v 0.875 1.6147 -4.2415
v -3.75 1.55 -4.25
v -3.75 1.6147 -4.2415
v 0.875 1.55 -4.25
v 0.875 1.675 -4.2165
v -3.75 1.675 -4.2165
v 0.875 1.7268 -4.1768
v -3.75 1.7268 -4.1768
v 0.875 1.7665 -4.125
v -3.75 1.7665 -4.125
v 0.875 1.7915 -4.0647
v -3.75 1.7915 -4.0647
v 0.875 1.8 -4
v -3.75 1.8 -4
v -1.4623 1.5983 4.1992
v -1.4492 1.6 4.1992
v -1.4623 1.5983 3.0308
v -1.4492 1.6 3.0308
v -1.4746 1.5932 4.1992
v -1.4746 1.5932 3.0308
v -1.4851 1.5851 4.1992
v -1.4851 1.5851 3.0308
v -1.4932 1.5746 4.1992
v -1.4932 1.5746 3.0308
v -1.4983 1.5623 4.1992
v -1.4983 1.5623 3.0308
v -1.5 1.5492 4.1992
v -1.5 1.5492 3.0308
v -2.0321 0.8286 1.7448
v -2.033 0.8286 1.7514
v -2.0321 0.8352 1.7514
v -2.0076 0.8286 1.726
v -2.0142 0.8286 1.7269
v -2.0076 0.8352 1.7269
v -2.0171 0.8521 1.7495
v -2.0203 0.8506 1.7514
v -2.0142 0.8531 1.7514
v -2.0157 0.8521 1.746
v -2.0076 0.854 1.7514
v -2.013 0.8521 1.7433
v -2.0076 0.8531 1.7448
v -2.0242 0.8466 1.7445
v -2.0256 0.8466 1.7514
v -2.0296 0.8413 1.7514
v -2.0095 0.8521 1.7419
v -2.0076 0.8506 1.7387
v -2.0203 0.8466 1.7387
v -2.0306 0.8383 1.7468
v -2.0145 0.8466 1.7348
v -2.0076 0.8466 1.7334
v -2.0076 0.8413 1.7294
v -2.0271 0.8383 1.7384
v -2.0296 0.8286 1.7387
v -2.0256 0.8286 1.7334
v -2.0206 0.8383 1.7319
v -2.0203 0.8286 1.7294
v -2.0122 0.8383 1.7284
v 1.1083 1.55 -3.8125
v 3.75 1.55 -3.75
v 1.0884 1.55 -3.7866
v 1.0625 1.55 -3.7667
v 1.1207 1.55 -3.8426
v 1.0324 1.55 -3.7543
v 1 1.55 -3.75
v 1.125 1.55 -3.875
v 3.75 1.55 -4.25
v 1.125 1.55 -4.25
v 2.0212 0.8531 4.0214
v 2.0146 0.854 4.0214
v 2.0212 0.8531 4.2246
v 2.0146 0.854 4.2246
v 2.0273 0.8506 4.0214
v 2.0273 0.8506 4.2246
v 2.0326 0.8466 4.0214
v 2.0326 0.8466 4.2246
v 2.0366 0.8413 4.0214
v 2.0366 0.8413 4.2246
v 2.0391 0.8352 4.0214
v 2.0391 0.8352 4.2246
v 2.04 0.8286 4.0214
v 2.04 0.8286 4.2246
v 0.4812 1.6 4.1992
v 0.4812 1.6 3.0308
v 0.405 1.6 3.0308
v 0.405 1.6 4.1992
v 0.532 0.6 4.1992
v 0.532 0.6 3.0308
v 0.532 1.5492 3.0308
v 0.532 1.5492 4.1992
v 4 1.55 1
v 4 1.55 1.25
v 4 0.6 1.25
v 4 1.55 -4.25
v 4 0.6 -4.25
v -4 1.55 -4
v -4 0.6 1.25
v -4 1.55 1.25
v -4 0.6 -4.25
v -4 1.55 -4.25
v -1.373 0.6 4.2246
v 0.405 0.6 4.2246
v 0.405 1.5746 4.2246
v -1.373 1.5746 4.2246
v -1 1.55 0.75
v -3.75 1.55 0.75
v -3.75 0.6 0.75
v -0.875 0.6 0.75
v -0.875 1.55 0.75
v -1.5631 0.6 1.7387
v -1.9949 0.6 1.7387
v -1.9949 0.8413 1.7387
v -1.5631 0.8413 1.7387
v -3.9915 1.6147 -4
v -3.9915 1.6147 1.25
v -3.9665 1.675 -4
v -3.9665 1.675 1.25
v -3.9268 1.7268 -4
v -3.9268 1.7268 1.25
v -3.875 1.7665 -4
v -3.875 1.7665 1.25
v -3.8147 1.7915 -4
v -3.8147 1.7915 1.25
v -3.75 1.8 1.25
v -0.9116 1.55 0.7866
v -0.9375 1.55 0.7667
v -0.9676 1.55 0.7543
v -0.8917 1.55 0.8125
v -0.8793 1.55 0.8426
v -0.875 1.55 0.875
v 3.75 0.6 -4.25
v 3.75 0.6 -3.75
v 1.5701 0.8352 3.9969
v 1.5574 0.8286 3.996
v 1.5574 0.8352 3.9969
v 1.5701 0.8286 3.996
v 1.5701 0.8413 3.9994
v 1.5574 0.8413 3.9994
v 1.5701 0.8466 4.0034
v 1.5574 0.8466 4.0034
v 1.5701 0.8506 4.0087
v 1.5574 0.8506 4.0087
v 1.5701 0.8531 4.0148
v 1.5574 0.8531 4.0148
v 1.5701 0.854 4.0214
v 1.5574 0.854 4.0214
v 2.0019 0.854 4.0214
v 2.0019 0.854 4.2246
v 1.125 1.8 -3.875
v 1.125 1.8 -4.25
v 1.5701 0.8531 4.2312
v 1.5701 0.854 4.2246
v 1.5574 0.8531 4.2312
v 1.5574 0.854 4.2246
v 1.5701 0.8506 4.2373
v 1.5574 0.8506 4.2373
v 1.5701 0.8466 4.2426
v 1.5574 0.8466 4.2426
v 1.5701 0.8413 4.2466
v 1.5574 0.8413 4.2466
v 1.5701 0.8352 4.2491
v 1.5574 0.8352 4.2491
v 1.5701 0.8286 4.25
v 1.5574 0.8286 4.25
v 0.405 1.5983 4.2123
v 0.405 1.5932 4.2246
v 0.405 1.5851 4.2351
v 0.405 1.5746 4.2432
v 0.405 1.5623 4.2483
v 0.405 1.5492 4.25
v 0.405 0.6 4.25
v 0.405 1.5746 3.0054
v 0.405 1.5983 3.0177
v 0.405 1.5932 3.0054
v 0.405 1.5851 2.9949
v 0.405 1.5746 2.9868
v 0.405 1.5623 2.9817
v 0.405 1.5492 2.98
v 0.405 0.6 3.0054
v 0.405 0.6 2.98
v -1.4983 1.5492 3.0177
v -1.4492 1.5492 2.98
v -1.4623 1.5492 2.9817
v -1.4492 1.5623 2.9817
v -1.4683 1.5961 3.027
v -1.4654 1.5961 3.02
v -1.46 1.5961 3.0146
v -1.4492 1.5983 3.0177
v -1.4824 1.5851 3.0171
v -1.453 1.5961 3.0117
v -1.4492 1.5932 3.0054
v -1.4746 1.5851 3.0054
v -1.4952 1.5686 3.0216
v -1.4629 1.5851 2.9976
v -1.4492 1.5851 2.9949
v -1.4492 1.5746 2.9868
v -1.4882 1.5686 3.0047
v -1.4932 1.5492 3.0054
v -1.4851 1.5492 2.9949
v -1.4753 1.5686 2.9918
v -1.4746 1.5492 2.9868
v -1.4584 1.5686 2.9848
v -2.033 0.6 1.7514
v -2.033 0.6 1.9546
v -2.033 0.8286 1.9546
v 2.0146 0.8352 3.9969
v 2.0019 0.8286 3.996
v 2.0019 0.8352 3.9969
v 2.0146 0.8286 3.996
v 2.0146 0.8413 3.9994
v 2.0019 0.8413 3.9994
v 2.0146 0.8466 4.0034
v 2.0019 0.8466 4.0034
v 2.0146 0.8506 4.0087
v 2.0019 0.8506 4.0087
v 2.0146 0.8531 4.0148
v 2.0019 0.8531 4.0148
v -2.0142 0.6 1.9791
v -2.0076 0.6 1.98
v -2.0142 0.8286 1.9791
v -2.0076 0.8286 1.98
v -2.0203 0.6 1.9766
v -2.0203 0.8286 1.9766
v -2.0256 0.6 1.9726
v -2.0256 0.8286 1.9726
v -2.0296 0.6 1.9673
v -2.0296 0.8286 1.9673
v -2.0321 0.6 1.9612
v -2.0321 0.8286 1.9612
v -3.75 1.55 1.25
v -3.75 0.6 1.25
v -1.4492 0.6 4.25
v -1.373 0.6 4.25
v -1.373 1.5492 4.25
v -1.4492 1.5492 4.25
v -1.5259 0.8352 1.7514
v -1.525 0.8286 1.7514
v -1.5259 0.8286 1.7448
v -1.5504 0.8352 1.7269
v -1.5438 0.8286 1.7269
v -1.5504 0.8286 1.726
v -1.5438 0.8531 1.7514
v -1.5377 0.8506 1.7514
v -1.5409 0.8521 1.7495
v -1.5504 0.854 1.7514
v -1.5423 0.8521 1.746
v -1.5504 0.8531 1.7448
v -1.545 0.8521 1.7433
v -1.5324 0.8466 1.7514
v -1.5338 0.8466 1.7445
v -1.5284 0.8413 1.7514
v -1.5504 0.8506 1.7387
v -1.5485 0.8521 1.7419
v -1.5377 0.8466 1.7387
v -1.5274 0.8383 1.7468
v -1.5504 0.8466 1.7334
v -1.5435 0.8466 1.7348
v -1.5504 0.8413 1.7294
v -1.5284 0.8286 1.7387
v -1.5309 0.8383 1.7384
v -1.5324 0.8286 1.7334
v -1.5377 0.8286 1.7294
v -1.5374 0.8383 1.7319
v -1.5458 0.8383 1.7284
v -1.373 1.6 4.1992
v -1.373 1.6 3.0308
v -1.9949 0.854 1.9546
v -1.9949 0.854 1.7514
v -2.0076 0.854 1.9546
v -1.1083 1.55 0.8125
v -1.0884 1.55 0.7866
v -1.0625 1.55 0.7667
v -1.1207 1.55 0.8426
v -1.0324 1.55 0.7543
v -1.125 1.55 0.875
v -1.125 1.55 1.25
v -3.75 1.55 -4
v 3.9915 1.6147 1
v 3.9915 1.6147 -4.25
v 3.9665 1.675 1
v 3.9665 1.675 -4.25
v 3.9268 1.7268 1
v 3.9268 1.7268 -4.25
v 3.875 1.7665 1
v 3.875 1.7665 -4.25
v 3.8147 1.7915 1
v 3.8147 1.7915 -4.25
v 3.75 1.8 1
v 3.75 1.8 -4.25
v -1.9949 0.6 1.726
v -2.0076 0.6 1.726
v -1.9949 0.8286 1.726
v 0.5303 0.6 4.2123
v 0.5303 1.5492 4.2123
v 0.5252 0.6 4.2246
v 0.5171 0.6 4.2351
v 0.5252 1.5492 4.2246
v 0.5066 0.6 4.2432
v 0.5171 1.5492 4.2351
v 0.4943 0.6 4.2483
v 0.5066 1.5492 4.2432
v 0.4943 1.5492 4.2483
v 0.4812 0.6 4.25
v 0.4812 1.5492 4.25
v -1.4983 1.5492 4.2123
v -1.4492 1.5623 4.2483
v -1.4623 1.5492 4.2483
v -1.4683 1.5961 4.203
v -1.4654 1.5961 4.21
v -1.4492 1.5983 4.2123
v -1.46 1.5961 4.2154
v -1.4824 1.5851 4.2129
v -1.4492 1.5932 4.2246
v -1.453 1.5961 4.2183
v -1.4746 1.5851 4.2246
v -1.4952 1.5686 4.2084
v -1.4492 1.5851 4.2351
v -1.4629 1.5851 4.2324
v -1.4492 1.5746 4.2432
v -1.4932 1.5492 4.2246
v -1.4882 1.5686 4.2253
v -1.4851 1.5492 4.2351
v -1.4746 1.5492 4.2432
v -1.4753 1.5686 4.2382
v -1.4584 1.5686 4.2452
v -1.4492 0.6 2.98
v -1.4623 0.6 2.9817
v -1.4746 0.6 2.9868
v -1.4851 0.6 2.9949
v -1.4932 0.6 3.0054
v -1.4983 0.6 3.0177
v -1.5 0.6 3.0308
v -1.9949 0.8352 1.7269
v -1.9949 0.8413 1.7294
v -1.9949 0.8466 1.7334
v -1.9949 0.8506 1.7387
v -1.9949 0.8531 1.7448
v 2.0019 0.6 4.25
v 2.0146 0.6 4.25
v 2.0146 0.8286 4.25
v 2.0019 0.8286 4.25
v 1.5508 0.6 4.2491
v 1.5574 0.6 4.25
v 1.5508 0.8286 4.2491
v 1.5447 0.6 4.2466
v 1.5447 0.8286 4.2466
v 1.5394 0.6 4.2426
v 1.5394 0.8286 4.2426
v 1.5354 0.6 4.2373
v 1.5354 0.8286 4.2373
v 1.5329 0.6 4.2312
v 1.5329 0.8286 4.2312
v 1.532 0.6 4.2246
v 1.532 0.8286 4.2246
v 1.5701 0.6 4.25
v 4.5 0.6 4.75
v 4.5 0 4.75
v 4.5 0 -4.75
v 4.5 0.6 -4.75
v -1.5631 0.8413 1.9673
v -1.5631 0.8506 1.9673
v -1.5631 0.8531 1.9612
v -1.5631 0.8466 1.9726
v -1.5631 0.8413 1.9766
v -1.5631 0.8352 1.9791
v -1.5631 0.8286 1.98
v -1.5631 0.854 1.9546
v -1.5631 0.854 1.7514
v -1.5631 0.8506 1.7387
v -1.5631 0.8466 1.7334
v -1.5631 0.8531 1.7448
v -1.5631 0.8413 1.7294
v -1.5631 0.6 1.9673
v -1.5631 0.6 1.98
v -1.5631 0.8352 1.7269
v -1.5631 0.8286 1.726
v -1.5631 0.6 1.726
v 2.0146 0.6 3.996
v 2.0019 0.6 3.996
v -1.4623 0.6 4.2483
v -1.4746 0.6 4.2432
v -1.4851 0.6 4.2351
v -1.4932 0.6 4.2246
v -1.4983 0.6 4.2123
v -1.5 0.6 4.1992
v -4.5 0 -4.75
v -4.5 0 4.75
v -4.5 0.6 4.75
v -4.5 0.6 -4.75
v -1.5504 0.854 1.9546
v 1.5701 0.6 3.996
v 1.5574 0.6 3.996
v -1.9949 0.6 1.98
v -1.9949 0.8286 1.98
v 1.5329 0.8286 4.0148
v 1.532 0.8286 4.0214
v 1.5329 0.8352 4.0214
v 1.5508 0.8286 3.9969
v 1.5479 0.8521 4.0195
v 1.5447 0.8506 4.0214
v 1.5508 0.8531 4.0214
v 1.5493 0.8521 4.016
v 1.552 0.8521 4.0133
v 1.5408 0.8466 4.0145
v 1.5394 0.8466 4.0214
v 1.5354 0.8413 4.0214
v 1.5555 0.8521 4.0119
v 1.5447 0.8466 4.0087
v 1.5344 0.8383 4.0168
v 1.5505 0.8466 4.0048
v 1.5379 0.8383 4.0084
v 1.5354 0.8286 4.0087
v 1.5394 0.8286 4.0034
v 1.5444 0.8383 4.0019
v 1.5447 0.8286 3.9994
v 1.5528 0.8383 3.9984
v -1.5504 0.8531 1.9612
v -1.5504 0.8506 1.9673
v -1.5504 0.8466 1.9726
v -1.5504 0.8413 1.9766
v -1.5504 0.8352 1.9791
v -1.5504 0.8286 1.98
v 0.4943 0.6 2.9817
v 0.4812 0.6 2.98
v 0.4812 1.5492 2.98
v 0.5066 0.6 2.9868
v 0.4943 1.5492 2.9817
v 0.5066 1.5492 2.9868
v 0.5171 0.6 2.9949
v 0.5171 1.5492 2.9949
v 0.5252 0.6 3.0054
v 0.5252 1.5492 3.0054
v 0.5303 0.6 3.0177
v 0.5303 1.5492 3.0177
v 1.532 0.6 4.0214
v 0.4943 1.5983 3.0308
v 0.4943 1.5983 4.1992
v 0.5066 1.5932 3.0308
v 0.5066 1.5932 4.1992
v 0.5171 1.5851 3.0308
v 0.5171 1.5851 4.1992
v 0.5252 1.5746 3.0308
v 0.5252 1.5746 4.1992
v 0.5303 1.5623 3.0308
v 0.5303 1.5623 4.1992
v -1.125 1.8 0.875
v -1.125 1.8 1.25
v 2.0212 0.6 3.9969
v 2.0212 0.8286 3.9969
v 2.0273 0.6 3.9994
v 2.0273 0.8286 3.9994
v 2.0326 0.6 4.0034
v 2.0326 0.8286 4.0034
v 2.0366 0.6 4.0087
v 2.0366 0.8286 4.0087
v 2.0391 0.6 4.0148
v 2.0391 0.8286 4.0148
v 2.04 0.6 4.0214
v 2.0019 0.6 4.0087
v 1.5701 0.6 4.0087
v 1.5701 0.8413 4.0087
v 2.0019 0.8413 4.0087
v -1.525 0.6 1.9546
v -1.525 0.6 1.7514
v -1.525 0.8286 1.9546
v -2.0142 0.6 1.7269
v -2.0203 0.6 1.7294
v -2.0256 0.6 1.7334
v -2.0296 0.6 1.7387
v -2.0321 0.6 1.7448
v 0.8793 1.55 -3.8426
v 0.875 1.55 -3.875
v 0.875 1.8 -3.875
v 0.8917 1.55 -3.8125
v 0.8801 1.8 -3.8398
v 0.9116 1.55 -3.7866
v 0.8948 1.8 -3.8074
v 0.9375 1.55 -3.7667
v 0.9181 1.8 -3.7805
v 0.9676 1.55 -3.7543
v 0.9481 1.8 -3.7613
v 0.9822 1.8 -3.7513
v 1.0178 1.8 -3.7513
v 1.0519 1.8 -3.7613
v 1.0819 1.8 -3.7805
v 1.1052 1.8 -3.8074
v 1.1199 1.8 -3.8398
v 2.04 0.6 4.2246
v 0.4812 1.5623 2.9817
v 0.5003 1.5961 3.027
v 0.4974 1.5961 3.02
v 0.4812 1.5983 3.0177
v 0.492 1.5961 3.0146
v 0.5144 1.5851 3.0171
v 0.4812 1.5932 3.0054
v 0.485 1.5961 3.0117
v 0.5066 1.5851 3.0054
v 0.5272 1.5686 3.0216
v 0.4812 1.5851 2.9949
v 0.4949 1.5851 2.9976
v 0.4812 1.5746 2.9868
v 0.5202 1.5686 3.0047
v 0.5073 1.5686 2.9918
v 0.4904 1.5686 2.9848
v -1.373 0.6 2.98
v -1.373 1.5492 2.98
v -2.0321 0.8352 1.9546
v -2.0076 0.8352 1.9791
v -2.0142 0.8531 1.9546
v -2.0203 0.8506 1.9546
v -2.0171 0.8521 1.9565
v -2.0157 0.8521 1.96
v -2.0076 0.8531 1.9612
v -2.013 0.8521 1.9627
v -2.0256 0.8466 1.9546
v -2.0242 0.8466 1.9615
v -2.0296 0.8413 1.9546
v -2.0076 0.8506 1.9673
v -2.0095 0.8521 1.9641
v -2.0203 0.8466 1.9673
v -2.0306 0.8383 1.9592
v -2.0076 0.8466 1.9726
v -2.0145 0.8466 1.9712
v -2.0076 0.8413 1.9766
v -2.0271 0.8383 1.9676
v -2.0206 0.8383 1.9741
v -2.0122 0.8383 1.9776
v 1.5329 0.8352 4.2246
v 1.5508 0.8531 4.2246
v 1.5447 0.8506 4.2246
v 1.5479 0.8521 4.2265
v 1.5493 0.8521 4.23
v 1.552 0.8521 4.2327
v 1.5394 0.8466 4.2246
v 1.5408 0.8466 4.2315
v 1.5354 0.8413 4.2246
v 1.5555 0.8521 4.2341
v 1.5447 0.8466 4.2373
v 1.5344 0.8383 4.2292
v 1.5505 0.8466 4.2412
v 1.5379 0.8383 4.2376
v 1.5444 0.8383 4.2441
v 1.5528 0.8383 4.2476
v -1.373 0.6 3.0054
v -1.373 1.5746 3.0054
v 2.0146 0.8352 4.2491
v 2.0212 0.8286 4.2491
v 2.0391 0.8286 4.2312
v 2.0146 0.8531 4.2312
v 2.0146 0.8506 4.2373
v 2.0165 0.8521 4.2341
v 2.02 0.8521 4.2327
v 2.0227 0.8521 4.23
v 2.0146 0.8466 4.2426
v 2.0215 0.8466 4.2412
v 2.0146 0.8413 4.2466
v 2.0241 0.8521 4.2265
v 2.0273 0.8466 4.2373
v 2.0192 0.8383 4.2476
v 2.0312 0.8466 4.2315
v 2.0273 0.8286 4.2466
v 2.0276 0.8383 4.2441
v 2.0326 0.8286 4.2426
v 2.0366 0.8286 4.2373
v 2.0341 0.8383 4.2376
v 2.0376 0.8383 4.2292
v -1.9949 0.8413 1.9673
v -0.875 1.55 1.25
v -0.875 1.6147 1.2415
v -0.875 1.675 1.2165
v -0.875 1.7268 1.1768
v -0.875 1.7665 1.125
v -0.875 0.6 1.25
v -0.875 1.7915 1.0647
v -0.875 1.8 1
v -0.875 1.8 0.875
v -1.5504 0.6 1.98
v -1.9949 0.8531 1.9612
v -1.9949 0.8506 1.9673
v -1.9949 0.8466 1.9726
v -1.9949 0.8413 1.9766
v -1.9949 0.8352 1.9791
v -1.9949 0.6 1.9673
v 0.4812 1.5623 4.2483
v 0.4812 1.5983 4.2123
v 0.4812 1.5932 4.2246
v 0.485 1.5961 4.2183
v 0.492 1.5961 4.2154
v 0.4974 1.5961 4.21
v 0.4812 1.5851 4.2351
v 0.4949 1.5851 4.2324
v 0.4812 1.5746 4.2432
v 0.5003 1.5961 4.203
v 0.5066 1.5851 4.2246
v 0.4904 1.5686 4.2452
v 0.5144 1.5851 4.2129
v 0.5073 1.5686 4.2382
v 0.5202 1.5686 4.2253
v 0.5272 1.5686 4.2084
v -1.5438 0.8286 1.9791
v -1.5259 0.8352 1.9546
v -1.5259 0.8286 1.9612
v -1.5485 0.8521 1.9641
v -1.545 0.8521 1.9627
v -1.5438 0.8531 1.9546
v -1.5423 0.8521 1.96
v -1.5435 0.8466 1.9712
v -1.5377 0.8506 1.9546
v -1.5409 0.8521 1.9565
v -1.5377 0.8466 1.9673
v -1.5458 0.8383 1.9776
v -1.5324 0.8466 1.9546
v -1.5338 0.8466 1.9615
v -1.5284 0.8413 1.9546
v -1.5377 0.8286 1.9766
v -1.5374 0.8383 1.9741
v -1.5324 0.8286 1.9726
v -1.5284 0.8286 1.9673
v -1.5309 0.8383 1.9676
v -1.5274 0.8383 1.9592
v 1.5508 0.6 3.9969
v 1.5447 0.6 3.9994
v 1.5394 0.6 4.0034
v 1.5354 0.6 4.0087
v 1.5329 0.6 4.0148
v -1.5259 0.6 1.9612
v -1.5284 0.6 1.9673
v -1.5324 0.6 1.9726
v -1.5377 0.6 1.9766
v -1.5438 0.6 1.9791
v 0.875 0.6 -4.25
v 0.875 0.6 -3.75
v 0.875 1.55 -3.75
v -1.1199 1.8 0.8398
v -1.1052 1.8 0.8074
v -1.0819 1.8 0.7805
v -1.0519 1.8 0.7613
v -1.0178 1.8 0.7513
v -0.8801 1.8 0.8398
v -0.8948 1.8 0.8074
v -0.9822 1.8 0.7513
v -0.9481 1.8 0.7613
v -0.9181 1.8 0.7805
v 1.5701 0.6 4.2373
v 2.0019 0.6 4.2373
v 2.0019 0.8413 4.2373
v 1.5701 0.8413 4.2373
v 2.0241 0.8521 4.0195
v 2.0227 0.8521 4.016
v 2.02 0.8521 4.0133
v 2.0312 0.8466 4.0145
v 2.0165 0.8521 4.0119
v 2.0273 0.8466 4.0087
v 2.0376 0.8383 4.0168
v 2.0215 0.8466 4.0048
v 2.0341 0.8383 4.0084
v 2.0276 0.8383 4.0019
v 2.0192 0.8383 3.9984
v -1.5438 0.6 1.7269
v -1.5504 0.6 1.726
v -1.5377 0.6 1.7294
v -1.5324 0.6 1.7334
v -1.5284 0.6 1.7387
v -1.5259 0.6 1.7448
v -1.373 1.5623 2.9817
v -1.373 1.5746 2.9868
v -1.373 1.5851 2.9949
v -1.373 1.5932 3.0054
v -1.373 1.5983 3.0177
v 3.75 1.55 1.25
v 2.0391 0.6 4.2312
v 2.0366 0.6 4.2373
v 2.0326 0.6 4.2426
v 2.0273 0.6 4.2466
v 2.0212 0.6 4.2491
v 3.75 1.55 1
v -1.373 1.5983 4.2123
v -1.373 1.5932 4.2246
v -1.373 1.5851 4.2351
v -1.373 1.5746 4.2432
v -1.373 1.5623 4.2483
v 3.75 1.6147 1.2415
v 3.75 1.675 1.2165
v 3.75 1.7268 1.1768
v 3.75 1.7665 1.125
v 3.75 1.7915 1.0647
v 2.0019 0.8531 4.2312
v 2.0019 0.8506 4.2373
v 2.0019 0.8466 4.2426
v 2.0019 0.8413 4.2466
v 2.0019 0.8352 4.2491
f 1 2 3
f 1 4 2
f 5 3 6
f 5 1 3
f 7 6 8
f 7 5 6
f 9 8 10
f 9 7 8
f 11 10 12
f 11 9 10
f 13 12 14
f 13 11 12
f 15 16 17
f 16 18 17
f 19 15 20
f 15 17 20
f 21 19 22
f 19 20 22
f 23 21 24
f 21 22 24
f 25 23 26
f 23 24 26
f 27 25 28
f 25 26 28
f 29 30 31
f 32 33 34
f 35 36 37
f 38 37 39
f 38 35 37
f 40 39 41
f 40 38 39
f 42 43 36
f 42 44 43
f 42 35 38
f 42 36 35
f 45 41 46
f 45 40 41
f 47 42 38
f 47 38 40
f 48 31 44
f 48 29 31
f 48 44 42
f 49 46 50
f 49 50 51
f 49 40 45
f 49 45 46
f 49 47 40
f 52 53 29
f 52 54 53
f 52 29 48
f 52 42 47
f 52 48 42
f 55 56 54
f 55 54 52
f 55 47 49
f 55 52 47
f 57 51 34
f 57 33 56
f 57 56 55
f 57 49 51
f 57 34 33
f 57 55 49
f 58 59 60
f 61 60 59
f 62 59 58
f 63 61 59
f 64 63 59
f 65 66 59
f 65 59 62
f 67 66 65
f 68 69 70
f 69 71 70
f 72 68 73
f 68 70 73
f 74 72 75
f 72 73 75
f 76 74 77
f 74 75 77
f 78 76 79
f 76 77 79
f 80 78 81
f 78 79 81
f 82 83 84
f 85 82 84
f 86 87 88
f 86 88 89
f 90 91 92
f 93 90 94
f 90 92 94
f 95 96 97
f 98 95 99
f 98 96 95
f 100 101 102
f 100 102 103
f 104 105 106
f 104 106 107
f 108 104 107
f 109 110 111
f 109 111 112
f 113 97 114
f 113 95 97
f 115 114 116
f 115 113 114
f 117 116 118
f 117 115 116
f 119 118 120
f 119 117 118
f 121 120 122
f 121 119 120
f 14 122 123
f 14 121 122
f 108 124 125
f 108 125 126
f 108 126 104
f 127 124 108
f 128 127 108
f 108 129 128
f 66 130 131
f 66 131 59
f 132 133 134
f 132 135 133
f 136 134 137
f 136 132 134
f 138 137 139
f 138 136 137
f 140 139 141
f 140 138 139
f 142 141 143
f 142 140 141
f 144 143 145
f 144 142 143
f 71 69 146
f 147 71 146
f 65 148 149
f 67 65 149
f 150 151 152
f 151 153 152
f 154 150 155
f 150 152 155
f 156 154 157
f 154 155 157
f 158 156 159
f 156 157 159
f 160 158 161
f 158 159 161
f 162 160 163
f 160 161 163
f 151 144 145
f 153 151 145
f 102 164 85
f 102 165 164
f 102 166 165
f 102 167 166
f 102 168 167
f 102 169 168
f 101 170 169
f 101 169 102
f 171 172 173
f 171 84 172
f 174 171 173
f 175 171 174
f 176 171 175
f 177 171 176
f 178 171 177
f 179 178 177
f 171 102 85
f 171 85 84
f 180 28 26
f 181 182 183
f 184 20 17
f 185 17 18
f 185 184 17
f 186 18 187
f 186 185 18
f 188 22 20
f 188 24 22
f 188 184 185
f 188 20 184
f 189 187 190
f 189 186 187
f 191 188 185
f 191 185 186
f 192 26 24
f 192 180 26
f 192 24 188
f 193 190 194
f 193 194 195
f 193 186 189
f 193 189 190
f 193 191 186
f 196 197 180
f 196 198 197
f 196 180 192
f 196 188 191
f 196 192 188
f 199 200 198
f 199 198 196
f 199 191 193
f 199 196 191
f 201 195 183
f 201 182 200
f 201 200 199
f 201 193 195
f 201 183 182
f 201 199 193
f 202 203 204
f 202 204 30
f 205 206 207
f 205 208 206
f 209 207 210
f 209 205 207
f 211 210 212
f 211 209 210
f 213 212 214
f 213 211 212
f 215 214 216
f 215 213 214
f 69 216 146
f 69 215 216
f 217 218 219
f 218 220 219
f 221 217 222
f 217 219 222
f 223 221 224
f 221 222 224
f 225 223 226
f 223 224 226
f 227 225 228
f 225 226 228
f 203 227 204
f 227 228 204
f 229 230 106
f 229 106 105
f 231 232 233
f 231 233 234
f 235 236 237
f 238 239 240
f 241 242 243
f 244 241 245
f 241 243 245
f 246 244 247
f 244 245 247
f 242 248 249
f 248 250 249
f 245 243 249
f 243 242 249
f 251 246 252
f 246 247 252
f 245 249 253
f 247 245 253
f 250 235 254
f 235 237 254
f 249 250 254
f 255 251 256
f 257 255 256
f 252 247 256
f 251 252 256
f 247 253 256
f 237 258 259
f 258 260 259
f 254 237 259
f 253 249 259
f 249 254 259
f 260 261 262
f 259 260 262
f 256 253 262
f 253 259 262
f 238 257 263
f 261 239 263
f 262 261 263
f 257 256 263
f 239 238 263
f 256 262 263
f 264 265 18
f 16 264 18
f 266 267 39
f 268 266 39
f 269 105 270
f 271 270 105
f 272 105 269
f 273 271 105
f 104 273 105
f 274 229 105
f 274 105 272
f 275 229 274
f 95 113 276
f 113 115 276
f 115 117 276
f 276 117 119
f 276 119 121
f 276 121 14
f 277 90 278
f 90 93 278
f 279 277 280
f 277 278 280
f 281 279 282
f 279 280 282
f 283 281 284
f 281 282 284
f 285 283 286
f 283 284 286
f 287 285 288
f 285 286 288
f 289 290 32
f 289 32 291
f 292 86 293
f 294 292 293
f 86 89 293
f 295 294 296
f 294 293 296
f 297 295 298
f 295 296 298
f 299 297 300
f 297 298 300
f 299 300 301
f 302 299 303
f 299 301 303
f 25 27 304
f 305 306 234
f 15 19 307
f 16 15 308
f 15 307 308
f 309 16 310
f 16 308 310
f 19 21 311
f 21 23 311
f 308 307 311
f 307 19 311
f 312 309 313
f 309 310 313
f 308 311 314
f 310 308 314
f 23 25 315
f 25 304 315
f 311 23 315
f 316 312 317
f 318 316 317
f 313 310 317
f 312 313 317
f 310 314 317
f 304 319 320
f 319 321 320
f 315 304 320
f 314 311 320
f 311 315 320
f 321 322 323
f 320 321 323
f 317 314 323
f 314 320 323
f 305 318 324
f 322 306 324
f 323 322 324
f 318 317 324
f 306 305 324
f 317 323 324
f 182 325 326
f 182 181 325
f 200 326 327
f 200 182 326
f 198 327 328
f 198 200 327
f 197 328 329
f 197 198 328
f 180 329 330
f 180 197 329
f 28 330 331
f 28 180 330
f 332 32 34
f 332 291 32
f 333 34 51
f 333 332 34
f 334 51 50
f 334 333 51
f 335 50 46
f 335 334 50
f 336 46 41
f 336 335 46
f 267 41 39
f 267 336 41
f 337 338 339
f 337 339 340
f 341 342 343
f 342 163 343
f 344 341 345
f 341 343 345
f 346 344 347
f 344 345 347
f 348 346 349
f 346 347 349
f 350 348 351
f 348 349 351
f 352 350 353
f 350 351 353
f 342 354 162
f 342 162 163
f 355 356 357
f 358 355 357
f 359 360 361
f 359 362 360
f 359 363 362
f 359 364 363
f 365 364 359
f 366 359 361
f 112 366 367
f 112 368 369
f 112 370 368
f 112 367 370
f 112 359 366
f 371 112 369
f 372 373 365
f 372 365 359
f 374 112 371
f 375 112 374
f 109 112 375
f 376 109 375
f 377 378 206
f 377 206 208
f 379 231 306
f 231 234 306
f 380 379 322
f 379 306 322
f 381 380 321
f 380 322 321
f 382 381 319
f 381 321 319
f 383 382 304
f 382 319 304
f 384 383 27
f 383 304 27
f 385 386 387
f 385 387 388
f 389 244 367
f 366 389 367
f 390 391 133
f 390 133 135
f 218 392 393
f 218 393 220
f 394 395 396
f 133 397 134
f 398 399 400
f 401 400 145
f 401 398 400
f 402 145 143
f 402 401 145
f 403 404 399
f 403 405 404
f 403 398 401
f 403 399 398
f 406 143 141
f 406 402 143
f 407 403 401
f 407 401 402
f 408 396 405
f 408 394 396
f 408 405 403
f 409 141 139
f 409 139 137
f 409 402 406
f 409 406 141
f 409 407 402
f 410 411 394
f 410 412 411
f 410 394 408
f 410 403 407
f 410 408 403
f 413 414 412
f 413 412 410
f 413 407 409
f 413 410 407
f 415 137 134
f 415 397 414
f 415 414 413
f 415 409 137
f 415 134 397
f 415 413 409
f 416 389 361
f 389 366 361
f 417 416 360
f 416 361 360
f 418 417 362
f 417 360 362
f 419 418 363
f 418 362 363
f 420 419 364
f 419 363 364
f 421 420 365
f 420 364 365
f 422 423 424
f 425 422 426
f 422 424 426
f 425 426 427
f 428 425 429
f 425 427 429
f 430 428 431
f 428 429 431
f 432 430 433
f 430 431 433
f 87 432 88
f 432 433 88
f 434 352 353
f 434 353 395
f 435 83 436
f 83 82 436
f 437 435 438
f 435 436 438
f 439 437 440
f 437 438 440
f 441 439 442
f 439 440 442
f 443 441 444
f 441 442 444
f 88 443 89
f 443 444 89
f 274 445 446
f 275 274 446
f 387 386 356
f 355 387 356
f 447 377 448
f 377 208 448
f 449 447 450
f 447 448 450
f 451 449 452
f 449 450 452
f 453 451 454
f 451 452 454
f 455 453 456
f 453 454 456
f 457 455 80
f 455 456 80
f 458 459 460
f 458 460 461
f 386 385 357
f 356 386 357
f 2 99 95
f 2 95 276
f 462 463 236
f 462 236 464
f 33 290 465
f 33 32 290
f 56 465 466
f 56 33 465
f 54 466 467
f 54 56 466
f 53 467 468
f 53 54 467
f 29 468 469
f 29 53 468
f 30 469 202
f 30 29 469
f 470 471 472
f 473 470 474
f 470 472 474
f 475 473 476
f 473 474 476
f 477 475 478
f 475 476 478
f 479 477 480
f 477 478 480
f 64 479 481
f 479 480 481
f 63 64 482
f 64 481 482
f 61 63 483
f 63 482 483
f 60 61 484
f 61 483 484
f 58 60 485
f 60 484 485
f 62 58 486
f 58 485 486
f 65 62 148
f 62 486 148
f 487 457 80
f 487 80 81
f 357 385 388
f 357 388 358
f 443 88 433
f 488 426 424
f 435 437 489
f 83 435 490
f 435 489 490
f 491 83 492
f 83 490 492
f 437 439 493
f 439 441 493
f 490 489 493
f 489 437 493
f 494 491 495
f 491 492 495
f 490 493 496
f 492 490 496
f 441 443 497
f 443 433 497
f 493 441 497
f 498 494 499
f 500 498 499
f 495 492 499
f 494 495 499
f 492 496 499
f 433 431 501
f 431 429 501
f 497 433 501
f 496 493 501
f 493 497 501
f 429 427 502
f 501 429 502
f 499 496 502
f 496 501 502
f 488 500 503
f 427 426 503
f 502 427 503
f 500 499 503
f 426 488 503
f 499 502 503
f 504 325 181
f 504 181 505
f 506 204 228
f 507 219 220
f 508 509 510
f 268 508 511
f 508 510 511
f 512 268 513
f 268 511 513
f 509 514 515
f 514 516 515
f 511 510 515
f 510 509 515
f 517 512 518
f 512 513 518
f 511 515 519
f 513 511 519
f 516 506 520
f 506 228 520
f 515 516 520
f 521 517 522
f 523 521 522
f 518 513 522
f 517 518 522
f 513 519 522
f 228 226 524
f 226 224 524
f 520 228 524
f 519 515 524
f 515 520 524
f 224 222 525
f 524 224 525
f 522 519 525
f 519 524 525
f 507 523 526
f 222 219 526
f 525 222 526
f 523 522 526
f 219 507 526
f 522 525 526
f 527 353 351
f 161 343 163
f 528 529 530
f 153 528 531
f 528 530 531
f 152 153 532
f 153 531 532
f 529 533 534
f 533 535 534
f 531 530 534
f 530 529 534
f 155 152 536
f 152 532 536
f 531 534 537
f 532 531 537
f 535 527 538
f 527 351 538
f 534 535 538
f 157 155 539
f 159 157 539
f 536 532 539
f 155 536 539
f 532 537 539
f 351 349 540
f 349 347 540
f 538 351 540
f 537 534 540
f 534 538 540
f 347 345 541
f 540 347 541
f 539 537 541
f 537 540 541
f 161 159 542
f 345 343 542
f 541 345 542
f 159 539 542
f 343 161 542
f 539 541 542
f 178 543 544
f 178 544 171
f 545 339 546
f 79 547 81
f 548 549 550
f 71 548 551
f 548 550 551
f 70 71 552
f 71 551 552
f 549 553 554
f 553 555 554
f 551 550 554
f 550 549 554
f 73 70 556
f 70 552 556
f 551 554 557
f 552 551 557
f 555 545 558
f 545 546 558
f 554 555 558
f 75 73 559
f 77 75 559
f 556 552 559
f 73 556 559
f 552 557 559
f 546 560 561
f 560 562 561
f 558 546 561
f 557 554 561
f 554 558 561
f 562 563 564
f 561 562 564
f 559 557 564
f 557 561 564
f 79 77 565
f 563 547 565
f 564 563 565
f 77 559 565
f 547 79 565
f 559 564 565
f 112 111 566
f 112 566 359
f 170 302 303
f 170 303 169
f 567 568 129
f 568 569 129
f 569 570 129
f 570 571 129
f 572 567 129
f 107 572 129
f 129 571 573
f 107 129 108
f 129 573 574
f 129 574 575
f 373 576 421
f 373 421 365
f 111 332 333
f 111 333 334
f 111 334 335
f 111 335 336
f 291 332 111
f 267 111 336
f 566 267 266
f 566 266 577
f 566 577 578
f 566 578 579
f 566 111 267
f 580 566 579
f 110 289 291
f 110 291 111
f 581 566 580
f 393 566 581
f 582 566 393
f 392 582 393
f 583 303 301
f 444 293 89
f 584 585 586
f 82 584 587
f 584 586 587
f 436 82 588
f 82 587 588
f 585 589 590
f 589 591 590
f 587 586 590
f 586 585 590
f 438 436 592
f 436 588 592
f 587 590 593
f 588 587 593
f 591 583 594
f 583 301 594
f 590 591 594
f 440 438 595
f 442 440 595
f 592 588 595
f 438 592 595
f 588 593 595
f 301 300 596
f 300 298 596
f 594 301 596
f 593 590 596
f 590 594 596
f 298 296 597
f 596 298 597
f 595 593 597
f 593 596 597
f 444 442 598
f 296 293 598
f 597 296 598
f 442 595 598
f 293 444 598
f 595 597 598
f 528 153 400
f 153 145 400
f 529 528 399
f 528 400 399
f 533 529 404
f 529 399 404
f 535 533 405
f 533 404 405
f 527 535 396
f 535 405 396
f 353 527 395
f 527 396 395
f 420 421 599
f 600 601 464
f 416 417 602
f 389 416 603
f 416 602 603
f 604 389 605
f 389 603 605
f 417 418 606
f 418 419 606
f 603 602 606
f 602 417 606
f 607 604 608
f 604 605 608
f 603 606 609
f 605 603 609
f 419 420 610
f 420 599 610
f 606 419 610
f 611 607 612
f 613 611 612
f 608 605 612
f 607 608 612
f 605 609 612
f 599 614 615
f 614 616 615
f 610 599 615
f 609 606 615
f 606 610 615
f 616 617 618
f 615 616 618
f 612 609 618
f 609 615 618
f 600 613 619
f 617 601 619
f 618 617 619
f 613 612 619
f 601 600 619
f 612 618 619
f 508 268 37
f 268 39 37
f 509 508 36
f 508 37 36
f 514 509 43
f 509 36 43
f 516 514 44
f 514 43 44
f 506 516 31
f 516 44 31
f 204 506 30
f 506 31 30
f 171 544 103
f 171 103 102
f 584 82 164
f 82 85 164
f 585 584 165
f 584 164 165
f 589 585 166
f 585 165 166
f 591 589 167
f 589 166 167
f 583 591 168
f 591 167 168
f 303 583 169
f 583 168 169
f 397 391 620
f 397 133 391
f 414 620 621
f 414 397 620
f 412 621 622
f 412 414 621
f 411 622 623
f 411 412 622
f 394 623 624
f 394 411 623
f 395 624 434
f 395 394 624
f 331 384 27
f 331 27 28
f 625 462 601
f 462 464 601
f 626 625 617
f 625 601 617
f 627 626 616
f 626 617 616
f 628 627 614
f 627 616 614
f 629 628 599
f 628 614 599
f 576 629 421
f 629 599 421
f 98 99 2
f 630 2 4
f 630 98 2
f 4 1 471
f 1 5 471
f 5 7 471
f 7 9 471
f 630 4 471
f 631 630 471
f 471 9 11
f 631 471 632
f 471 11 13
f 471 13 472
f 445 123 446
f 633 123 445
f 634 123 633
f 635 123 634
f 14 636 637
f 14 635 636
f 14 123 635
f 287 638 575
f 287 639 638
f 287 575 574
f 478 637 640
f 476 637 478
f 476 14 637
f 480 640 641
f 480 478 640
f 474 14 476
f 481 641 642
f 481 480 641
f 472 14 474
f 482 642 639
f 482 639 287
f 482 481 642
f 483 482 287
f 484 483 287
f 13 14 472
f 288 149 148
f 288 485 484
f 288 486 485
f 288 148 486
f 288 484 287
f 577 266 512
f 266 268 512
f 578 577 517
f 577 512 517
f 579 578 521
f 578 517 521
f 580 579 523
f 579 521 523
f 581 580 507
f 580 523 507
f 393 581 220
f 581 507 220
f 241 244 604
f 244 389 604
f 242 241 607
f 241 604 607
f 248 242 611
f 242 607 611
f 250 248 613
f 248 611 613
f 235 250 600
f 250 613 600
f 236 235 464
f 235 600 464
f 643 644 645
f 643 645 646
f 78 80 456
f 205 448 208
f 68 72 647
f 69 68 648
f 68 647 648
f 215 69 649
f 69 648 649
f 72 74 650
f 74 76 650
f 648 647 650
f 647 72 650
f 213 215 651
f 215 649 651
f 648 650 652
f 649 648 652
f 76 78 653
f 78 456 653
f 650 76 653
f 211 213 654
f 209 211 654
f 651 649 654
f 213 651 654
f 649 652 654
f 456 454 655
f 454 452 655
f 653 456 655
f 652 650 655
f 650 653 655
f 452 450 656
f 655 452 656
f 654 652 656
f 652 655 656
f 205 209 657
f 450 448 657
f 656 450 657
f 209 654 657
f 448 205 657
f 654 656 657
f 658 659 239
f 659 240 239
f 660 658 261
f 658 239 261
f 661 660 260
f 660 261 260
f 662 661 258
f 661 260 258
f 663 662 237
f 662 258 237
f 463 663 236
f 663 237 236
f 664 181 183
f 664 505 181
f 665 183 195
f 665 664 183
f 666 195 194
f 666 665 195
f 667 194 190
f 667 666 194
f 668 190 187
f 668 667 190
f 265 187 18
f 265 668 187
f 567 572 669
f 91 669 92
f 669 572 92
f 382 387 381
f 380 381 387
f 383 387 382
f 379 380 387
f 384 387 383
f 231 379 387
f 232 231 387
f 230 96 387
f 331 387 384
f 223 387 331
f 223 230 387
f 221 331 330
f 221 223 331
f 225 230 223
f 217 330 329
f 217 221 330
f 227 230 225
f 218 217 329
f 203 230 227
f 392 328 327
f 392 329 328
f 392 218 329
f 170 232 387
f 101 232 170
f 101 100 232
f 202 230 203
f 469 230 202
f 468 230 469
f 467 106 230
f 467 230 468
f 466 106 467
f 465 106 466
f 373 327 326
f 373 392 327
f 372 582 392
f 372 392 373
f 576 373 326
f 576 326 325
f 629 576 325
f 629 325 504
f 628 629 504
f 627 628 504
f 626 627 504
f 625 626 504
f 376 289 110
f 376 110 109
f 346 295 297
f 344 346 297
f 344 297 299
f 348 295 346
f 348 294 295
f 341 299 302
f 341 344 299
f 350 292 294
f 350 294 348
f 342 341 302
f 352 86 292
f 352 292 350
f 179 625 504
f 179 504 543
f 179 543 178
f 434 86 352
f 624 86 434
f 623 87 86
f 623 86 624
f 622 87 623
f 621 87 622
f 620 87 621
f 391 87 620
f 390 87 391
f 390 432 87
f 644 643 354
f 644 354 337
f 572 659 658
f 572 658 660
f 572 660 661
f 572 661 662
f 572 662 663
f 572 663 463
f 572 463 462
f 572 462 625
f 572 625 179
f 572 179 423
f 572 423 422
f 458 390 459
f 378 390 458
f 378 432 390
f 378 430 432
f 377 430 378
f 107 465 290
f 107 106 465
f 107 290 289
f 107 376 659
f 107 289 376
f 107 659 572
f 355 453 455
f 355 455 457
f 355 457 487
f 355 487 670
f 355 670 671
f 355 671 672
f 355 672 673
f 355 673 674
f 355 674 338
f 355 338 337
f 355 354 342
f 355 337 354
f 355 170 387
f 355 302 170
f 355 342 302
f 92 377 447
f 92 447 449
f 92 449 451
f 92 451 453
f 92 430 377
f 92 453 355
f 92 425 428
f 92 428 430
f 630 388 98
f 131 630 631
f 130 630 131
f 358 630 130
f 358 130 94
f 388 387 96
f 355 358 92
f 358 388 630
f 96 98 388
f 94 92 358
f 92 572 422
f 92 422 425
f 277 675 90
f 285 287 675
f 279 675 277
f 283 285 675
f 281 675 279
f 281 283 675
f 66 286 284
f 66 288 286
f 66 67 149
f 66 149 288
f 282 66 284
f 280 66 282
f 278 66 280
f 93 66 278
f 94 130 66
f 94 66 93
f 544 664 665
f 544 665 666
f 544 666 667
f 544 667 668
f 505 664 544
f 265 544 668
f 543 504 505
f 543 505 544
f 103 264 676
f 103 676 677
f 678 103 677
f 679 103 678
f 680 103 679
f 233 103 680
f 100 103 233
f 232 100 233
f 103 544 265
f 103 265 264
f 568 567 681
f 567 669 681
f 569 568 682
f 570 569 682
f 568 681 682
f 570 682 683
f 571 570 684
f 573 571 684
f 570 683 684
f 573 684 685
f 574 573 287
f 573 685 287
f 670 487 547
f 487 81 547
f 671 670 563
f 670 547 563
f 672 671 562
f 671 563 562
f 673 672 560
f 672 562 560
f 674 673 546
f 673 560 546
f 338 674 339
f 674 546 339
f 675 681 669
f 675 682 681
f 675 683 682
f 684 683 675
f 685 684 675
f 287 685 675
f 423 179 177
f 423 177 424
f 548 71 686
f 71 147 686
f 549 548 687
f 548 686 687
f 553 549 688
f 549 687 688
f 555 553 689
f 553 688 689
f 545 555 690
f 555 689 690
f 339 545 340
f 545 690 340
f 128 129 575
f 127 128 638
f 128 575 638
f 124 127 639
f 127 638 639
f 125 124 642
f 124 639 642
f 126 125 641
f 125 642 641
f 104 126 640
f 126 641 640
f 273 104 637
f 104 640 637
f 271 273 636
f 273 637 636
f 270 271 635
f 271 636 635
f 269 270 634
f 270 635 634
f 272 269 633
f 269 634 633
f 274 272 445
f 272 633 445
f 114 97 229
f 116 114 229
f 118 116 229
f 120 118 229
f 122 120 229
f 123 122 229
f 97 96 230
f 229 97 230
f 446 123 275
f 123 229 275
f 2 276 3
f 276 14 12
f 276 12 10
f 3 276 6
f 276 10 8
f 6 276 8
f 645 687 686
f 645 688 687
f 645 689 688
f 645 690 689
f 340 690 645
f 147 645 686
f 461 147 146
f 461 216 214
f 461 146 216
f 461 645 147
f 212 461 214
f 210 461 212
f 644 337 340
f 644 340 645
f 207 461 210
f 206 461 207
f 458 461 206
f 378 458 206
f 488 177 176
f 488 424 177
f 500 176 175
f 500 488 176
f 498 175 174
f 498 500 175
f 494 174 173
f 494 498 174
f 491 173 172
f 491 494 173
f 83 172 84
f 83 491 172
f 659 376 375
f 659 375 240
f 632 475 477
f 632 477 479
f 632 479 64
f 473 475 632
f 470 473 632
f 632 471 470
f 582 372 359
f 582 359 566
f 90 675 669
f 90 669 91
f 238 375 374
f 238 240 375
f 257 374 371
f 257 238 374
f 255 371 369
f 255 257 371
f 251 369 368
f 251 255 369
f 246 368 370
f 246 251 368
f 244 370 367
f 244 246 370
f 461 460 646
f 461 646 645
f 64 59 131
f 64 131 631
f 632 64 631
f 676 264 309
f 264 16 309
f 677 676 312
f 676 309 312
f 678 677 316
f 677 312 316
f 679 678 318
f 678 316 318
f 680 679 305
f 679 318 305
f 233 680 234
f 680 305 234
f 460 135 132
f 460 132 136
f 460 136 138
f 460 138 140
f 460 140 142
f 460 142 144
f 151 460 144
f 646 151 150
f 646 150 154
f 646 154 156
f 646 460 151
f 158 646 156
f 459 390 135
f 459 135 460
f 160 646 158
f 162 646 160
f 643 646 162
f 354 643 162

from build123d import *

# Parameters (mm, degrees)
SKETCH1_W           = 9
SKETCH1_H           = 9.5
BOSS_EXTRUDE1_DEPTH = 0.6
SKETCH2_W           = 8
SKETCH2_H           = 5.5
BOSS_EXTRUDE2_DEPTH = 1.2
CUT_EXTRUDE1_DEPTH  = 1.2
SKETCH4_W           = 0.25
SKETCH4_H           = 0.25
CUT_EXTRUDE2_DEPTH  = 0.25
FILLET1_R           = 0.25
SKETCH5_W           = 2.875
SKETCH5_H           = 0.95
CUT_EXTRUDE3_DEPTH  = 0.5
SKETCH7_W           = 2.875
SKETCH7_H           = 0.95
CUT_EXTRUDE4_DEPTH  = 0.5
BOSS_EXTRUDE3_DEPTH = 1
SKETCH9_W           = 1.778
SKETCH9_H           = 1.2192
CUT_EXTRUDE5_DEPTH  = 0.0254
FILLET2_R           = 0.0508
BOSS_EXTRUDE4_DEPTH = 0.254
SKETCH11_W          = 0.4318
SKETCH11_H          = 0.2286
CUT_EXTRUDE6_DEPTH  = 0.0127
FILLET3_R           = 0.0254


with BuildPart() as part:
    # Sketch1 → Boss-Extrude1 (new body)
    with BuildSketch(Plane(origin=(0, 0, 0), x_dir=(1, 0, 0), z_dir=(0, 1, 0))):
        Rectangle(SKETCH1_W, SKETCH1_H)
    extrude(amount=BOSS_EXTRUDE1_DEPTH)

    # Sketch2 → Boss-Extrude2 (add)
    with BuildSketch(Plane(origin=(0, 0.6, 0), x_dir=(1, 0, 0), z_dir=(0, 1, 0))):
        with Locations((0, 1.5)):
            Rectangle(SKETCH2_W, SKETCH2_H)
    extrude(amount=BOSS_EXTRUDE2_DEPTH)

    # Sketch3 → Cut-Extrude1 (cut)
    with BuildSketch(Plane(origin=(0, 1.8, 0), x_dir=(1, 0, 0), z_dir=(0, 1, 0))):
        with BuildLine():
            Line((0.875, 4.25), (0.875, 3.875))
            ThreePointArc((0.875, 3.875), (1, 3.75), (1.125, 3.875))
            Line((1.125, 3.875), (1.125, 4.25))
            Line((1.125, 4.25), (0.875, 4.25))
        make_face()
        with BuildLine():
            Line((-1.125, -0.875), (-1.125, -1.25))
            Line((-1.125, -1.25), (-0.875, -1.25))
            Line((-0.875, -1.25), (-0.875, -0.875))
            ThreePointArc((-0.875, -0.875), (-1, -0.75), (-1.125, -0.875))
        make_face()
    extrude(amount=-CUT_EXTRUDE1_DEPTH, mode=Mode.SUBTRACT)

    # Sketch4 → Cut-Extrude2 (cut)
    with BuildSketch(Plane(origin=(0, 1.8, 0), x_dir=(1, 0, 0), z_dir=(0, 1, 0))):
        with Locations((3.875, -1.125)):
            Rectangle(SKETCH4_W, SKETCH4_H)
        with Locations((-3.875, 4.125)):
            Rectangle(SKETCH4_W, SKETCH4_H)
    extrude(amount=-CUT_EXTRUDE2_DEPTH, mode=Mode.SUBTRACT)

    # Fillet1
    fillet1_edges = [part.edges().sort_by_distance(p)[0] for p in [
        (-1.4375, 1.8, -4.25),
        (4, 1.8, -1.625),
        (1.4375, 1.8, 1.25),
        (-4, 1.8, -1.375),
    ]]
    fillet(fillet1_edges, radius=FILLET1_R)

    # Sketch5 → Cut-Extrude3 (cut)
    with BuildSketch(Plane.XY.offset(1.25)):
        with Locations((-2.3125, 1.075)):
            Rectangle(SKETCH5_W, SKETCH5_H)
    extrude(amount=-CUT_EXTRUDE3_DEPTH, mode=Mode.SUBTRACT)

    # Sketch7 → Cut-Extrude4 (cut)
    with BuildSketch(Plane(origin=(0, 0, -4.25), x_dir=(-1, 0, 0), z_dir=(0, 0, -1))):
        with Locations((-2.3125, 1.075)):
            Rectangle(SKETCH7_W, SKETCH7_H)
    extrude(amount=-CUT_EXTRUDE4_DEPTH, mode=Mode.SUBTRACT)

    # Sketch8 → Boss-Extrude3 (add)
    with BuildSketch(Plane(origin=(0, 0.6, 0), x_dir=(1, 0, 0), z_dir=(0, 1, 0))):
        Polygon((-1.5, -2.98), (-1.373, -2.98), (-1.373, -3.0054), (0.405, -3.0054), (0.405, -2.98), (0.532, -2.98), (0.532, -4.25), (0.405, -4.25), (0.405, -4.2246), (-1.373, -4.2246), (-1.373, -4.25), (-1.5, -4.25), align=None)
    extrude(amount=BOSS_EXTRUDE3_DEPTH)

    # Sketch9 → Cut-Extrude5 (cut)
    with BuildSketch(Plane(origin=(0, 1.6, 0), x_dir=(1, 0, 0), z_dir=(0, 1, 0))):
        with Locations((-0.484, -3.615)):
            Rectangle(SKETCH9_W, SKETCH9_H)
    extrude(amount=-CUT_EXTRUDE5_DEPTH, mode=Mode.SUBTRACT)

    # Fillet2
    fillet2_edges = [part.edges().sort_by_distance(p)[0] for p in [
        (-1.5, 1.1, 2.98),
        (-1.5, 1.1, 4.25),
        (0.532, 1.1, 4.25),
        (0.532, 1.1, 2.98),
        (-1.5, 1.6, 3.615),
        (-1.4365, 1.6, 4.25),
        (0.4685, 1.6, 4.25),
        (0.532, 1.6, 3.615),
        (0.4685, 1.6, 2.98),
        (-1.4365, 1.6, 2.98),
    ]]
    fillet(fillet2_edges, radius=FILLET2_R)

    # Sketch10 → Boss-Extrude4 (add)
    with BuildSketch(Plane(origin=(0, 0.6, 0), x_dir=(1, 0, 0), z_dir=(0, 1, 0))):
        Polygon((-2.033, -1.726), (-1.9949, -1.726), (-1.9949, -1.7387), (-1.5631, -1.7387), (-1.5631, -1.726), (-1.525, -1.726), (-1.525, -1.98), (-1.5631, -1.98), (-1.5631, -1.9673), (-1.9949, -1.9673), (-1.9949, -1.98), (-2.033, -1.98), align=None)
        Polygon((1.532, -3.996), (1.5701, -3.996), (1.5701, -4.0087), (2.0019, -4.0087), (2.0019, -3.996), (2.04, -3.996), (2.04, -4.25), (2.0019, -4.25), (2.0019, -4.2373), (1.5701, -4.2373), (1.5701, -4.25), (1.532, -4.25), align=None)
    extrude(amount=BOSS_EXTRUDE4_DEPTH)

    # Sketch11 → Cut-Extrude6 (cut)
    with BuildSketch(Plane(origin=(0, 0.854, 0), x_dir=(1, 0, 0), z_dir=(0, 1, 0))):
        with Locations((-1.779, -1.853)):
            Rectangle(SKETCH11_W, SKETCH11_H)
        with Locations((1.786, -4.123)):
            Rectangle(SKETCH11_W, SKETCH11_H)
    extrude(amount=-CUT_EXTRUDE6_DEPTH, mode=Mode.SUBTRACT)

    # Fillet3
    fillet3_edges = [part.edges().sort_by_distance(p)[0] for p in [
        (-2.033, 0.727, 1.726),
        (-2.033, 0.727, 1.98),
        (-1.525, 0.727, 1.98),
        (-1.525, 0.727, 1.726),
        (-2.033, 0.854, 1.853),
        (-2.01395, 0.854, 1.98),
        (-1.54405, 0.854, 1.98),
        (-1.525, 0.854, 1.853),
        (-1.54405, 0.854, 1.726),
        (-2.01395, 0.854, 1.726),
        (1.532, 0.727, 3.996),
        (1.532, 0.727, 4.25),
        (2.04, 0.727, 4.25),
        (2.04, 0.727, 3.996),
        (1.532, 0.854, 4.123),
        (1.55105, 0.854, 4.25),
        (2.02095, 0.854, 4.25),
        (2.04, 0.854, 4.123),
        (2.02095, 0.854, 3.996),
        (1.55105, 0.854, 3.996),
    ]]
    fillet(fillet3_edges, radius=FILLET3_R)


solid = part.part
